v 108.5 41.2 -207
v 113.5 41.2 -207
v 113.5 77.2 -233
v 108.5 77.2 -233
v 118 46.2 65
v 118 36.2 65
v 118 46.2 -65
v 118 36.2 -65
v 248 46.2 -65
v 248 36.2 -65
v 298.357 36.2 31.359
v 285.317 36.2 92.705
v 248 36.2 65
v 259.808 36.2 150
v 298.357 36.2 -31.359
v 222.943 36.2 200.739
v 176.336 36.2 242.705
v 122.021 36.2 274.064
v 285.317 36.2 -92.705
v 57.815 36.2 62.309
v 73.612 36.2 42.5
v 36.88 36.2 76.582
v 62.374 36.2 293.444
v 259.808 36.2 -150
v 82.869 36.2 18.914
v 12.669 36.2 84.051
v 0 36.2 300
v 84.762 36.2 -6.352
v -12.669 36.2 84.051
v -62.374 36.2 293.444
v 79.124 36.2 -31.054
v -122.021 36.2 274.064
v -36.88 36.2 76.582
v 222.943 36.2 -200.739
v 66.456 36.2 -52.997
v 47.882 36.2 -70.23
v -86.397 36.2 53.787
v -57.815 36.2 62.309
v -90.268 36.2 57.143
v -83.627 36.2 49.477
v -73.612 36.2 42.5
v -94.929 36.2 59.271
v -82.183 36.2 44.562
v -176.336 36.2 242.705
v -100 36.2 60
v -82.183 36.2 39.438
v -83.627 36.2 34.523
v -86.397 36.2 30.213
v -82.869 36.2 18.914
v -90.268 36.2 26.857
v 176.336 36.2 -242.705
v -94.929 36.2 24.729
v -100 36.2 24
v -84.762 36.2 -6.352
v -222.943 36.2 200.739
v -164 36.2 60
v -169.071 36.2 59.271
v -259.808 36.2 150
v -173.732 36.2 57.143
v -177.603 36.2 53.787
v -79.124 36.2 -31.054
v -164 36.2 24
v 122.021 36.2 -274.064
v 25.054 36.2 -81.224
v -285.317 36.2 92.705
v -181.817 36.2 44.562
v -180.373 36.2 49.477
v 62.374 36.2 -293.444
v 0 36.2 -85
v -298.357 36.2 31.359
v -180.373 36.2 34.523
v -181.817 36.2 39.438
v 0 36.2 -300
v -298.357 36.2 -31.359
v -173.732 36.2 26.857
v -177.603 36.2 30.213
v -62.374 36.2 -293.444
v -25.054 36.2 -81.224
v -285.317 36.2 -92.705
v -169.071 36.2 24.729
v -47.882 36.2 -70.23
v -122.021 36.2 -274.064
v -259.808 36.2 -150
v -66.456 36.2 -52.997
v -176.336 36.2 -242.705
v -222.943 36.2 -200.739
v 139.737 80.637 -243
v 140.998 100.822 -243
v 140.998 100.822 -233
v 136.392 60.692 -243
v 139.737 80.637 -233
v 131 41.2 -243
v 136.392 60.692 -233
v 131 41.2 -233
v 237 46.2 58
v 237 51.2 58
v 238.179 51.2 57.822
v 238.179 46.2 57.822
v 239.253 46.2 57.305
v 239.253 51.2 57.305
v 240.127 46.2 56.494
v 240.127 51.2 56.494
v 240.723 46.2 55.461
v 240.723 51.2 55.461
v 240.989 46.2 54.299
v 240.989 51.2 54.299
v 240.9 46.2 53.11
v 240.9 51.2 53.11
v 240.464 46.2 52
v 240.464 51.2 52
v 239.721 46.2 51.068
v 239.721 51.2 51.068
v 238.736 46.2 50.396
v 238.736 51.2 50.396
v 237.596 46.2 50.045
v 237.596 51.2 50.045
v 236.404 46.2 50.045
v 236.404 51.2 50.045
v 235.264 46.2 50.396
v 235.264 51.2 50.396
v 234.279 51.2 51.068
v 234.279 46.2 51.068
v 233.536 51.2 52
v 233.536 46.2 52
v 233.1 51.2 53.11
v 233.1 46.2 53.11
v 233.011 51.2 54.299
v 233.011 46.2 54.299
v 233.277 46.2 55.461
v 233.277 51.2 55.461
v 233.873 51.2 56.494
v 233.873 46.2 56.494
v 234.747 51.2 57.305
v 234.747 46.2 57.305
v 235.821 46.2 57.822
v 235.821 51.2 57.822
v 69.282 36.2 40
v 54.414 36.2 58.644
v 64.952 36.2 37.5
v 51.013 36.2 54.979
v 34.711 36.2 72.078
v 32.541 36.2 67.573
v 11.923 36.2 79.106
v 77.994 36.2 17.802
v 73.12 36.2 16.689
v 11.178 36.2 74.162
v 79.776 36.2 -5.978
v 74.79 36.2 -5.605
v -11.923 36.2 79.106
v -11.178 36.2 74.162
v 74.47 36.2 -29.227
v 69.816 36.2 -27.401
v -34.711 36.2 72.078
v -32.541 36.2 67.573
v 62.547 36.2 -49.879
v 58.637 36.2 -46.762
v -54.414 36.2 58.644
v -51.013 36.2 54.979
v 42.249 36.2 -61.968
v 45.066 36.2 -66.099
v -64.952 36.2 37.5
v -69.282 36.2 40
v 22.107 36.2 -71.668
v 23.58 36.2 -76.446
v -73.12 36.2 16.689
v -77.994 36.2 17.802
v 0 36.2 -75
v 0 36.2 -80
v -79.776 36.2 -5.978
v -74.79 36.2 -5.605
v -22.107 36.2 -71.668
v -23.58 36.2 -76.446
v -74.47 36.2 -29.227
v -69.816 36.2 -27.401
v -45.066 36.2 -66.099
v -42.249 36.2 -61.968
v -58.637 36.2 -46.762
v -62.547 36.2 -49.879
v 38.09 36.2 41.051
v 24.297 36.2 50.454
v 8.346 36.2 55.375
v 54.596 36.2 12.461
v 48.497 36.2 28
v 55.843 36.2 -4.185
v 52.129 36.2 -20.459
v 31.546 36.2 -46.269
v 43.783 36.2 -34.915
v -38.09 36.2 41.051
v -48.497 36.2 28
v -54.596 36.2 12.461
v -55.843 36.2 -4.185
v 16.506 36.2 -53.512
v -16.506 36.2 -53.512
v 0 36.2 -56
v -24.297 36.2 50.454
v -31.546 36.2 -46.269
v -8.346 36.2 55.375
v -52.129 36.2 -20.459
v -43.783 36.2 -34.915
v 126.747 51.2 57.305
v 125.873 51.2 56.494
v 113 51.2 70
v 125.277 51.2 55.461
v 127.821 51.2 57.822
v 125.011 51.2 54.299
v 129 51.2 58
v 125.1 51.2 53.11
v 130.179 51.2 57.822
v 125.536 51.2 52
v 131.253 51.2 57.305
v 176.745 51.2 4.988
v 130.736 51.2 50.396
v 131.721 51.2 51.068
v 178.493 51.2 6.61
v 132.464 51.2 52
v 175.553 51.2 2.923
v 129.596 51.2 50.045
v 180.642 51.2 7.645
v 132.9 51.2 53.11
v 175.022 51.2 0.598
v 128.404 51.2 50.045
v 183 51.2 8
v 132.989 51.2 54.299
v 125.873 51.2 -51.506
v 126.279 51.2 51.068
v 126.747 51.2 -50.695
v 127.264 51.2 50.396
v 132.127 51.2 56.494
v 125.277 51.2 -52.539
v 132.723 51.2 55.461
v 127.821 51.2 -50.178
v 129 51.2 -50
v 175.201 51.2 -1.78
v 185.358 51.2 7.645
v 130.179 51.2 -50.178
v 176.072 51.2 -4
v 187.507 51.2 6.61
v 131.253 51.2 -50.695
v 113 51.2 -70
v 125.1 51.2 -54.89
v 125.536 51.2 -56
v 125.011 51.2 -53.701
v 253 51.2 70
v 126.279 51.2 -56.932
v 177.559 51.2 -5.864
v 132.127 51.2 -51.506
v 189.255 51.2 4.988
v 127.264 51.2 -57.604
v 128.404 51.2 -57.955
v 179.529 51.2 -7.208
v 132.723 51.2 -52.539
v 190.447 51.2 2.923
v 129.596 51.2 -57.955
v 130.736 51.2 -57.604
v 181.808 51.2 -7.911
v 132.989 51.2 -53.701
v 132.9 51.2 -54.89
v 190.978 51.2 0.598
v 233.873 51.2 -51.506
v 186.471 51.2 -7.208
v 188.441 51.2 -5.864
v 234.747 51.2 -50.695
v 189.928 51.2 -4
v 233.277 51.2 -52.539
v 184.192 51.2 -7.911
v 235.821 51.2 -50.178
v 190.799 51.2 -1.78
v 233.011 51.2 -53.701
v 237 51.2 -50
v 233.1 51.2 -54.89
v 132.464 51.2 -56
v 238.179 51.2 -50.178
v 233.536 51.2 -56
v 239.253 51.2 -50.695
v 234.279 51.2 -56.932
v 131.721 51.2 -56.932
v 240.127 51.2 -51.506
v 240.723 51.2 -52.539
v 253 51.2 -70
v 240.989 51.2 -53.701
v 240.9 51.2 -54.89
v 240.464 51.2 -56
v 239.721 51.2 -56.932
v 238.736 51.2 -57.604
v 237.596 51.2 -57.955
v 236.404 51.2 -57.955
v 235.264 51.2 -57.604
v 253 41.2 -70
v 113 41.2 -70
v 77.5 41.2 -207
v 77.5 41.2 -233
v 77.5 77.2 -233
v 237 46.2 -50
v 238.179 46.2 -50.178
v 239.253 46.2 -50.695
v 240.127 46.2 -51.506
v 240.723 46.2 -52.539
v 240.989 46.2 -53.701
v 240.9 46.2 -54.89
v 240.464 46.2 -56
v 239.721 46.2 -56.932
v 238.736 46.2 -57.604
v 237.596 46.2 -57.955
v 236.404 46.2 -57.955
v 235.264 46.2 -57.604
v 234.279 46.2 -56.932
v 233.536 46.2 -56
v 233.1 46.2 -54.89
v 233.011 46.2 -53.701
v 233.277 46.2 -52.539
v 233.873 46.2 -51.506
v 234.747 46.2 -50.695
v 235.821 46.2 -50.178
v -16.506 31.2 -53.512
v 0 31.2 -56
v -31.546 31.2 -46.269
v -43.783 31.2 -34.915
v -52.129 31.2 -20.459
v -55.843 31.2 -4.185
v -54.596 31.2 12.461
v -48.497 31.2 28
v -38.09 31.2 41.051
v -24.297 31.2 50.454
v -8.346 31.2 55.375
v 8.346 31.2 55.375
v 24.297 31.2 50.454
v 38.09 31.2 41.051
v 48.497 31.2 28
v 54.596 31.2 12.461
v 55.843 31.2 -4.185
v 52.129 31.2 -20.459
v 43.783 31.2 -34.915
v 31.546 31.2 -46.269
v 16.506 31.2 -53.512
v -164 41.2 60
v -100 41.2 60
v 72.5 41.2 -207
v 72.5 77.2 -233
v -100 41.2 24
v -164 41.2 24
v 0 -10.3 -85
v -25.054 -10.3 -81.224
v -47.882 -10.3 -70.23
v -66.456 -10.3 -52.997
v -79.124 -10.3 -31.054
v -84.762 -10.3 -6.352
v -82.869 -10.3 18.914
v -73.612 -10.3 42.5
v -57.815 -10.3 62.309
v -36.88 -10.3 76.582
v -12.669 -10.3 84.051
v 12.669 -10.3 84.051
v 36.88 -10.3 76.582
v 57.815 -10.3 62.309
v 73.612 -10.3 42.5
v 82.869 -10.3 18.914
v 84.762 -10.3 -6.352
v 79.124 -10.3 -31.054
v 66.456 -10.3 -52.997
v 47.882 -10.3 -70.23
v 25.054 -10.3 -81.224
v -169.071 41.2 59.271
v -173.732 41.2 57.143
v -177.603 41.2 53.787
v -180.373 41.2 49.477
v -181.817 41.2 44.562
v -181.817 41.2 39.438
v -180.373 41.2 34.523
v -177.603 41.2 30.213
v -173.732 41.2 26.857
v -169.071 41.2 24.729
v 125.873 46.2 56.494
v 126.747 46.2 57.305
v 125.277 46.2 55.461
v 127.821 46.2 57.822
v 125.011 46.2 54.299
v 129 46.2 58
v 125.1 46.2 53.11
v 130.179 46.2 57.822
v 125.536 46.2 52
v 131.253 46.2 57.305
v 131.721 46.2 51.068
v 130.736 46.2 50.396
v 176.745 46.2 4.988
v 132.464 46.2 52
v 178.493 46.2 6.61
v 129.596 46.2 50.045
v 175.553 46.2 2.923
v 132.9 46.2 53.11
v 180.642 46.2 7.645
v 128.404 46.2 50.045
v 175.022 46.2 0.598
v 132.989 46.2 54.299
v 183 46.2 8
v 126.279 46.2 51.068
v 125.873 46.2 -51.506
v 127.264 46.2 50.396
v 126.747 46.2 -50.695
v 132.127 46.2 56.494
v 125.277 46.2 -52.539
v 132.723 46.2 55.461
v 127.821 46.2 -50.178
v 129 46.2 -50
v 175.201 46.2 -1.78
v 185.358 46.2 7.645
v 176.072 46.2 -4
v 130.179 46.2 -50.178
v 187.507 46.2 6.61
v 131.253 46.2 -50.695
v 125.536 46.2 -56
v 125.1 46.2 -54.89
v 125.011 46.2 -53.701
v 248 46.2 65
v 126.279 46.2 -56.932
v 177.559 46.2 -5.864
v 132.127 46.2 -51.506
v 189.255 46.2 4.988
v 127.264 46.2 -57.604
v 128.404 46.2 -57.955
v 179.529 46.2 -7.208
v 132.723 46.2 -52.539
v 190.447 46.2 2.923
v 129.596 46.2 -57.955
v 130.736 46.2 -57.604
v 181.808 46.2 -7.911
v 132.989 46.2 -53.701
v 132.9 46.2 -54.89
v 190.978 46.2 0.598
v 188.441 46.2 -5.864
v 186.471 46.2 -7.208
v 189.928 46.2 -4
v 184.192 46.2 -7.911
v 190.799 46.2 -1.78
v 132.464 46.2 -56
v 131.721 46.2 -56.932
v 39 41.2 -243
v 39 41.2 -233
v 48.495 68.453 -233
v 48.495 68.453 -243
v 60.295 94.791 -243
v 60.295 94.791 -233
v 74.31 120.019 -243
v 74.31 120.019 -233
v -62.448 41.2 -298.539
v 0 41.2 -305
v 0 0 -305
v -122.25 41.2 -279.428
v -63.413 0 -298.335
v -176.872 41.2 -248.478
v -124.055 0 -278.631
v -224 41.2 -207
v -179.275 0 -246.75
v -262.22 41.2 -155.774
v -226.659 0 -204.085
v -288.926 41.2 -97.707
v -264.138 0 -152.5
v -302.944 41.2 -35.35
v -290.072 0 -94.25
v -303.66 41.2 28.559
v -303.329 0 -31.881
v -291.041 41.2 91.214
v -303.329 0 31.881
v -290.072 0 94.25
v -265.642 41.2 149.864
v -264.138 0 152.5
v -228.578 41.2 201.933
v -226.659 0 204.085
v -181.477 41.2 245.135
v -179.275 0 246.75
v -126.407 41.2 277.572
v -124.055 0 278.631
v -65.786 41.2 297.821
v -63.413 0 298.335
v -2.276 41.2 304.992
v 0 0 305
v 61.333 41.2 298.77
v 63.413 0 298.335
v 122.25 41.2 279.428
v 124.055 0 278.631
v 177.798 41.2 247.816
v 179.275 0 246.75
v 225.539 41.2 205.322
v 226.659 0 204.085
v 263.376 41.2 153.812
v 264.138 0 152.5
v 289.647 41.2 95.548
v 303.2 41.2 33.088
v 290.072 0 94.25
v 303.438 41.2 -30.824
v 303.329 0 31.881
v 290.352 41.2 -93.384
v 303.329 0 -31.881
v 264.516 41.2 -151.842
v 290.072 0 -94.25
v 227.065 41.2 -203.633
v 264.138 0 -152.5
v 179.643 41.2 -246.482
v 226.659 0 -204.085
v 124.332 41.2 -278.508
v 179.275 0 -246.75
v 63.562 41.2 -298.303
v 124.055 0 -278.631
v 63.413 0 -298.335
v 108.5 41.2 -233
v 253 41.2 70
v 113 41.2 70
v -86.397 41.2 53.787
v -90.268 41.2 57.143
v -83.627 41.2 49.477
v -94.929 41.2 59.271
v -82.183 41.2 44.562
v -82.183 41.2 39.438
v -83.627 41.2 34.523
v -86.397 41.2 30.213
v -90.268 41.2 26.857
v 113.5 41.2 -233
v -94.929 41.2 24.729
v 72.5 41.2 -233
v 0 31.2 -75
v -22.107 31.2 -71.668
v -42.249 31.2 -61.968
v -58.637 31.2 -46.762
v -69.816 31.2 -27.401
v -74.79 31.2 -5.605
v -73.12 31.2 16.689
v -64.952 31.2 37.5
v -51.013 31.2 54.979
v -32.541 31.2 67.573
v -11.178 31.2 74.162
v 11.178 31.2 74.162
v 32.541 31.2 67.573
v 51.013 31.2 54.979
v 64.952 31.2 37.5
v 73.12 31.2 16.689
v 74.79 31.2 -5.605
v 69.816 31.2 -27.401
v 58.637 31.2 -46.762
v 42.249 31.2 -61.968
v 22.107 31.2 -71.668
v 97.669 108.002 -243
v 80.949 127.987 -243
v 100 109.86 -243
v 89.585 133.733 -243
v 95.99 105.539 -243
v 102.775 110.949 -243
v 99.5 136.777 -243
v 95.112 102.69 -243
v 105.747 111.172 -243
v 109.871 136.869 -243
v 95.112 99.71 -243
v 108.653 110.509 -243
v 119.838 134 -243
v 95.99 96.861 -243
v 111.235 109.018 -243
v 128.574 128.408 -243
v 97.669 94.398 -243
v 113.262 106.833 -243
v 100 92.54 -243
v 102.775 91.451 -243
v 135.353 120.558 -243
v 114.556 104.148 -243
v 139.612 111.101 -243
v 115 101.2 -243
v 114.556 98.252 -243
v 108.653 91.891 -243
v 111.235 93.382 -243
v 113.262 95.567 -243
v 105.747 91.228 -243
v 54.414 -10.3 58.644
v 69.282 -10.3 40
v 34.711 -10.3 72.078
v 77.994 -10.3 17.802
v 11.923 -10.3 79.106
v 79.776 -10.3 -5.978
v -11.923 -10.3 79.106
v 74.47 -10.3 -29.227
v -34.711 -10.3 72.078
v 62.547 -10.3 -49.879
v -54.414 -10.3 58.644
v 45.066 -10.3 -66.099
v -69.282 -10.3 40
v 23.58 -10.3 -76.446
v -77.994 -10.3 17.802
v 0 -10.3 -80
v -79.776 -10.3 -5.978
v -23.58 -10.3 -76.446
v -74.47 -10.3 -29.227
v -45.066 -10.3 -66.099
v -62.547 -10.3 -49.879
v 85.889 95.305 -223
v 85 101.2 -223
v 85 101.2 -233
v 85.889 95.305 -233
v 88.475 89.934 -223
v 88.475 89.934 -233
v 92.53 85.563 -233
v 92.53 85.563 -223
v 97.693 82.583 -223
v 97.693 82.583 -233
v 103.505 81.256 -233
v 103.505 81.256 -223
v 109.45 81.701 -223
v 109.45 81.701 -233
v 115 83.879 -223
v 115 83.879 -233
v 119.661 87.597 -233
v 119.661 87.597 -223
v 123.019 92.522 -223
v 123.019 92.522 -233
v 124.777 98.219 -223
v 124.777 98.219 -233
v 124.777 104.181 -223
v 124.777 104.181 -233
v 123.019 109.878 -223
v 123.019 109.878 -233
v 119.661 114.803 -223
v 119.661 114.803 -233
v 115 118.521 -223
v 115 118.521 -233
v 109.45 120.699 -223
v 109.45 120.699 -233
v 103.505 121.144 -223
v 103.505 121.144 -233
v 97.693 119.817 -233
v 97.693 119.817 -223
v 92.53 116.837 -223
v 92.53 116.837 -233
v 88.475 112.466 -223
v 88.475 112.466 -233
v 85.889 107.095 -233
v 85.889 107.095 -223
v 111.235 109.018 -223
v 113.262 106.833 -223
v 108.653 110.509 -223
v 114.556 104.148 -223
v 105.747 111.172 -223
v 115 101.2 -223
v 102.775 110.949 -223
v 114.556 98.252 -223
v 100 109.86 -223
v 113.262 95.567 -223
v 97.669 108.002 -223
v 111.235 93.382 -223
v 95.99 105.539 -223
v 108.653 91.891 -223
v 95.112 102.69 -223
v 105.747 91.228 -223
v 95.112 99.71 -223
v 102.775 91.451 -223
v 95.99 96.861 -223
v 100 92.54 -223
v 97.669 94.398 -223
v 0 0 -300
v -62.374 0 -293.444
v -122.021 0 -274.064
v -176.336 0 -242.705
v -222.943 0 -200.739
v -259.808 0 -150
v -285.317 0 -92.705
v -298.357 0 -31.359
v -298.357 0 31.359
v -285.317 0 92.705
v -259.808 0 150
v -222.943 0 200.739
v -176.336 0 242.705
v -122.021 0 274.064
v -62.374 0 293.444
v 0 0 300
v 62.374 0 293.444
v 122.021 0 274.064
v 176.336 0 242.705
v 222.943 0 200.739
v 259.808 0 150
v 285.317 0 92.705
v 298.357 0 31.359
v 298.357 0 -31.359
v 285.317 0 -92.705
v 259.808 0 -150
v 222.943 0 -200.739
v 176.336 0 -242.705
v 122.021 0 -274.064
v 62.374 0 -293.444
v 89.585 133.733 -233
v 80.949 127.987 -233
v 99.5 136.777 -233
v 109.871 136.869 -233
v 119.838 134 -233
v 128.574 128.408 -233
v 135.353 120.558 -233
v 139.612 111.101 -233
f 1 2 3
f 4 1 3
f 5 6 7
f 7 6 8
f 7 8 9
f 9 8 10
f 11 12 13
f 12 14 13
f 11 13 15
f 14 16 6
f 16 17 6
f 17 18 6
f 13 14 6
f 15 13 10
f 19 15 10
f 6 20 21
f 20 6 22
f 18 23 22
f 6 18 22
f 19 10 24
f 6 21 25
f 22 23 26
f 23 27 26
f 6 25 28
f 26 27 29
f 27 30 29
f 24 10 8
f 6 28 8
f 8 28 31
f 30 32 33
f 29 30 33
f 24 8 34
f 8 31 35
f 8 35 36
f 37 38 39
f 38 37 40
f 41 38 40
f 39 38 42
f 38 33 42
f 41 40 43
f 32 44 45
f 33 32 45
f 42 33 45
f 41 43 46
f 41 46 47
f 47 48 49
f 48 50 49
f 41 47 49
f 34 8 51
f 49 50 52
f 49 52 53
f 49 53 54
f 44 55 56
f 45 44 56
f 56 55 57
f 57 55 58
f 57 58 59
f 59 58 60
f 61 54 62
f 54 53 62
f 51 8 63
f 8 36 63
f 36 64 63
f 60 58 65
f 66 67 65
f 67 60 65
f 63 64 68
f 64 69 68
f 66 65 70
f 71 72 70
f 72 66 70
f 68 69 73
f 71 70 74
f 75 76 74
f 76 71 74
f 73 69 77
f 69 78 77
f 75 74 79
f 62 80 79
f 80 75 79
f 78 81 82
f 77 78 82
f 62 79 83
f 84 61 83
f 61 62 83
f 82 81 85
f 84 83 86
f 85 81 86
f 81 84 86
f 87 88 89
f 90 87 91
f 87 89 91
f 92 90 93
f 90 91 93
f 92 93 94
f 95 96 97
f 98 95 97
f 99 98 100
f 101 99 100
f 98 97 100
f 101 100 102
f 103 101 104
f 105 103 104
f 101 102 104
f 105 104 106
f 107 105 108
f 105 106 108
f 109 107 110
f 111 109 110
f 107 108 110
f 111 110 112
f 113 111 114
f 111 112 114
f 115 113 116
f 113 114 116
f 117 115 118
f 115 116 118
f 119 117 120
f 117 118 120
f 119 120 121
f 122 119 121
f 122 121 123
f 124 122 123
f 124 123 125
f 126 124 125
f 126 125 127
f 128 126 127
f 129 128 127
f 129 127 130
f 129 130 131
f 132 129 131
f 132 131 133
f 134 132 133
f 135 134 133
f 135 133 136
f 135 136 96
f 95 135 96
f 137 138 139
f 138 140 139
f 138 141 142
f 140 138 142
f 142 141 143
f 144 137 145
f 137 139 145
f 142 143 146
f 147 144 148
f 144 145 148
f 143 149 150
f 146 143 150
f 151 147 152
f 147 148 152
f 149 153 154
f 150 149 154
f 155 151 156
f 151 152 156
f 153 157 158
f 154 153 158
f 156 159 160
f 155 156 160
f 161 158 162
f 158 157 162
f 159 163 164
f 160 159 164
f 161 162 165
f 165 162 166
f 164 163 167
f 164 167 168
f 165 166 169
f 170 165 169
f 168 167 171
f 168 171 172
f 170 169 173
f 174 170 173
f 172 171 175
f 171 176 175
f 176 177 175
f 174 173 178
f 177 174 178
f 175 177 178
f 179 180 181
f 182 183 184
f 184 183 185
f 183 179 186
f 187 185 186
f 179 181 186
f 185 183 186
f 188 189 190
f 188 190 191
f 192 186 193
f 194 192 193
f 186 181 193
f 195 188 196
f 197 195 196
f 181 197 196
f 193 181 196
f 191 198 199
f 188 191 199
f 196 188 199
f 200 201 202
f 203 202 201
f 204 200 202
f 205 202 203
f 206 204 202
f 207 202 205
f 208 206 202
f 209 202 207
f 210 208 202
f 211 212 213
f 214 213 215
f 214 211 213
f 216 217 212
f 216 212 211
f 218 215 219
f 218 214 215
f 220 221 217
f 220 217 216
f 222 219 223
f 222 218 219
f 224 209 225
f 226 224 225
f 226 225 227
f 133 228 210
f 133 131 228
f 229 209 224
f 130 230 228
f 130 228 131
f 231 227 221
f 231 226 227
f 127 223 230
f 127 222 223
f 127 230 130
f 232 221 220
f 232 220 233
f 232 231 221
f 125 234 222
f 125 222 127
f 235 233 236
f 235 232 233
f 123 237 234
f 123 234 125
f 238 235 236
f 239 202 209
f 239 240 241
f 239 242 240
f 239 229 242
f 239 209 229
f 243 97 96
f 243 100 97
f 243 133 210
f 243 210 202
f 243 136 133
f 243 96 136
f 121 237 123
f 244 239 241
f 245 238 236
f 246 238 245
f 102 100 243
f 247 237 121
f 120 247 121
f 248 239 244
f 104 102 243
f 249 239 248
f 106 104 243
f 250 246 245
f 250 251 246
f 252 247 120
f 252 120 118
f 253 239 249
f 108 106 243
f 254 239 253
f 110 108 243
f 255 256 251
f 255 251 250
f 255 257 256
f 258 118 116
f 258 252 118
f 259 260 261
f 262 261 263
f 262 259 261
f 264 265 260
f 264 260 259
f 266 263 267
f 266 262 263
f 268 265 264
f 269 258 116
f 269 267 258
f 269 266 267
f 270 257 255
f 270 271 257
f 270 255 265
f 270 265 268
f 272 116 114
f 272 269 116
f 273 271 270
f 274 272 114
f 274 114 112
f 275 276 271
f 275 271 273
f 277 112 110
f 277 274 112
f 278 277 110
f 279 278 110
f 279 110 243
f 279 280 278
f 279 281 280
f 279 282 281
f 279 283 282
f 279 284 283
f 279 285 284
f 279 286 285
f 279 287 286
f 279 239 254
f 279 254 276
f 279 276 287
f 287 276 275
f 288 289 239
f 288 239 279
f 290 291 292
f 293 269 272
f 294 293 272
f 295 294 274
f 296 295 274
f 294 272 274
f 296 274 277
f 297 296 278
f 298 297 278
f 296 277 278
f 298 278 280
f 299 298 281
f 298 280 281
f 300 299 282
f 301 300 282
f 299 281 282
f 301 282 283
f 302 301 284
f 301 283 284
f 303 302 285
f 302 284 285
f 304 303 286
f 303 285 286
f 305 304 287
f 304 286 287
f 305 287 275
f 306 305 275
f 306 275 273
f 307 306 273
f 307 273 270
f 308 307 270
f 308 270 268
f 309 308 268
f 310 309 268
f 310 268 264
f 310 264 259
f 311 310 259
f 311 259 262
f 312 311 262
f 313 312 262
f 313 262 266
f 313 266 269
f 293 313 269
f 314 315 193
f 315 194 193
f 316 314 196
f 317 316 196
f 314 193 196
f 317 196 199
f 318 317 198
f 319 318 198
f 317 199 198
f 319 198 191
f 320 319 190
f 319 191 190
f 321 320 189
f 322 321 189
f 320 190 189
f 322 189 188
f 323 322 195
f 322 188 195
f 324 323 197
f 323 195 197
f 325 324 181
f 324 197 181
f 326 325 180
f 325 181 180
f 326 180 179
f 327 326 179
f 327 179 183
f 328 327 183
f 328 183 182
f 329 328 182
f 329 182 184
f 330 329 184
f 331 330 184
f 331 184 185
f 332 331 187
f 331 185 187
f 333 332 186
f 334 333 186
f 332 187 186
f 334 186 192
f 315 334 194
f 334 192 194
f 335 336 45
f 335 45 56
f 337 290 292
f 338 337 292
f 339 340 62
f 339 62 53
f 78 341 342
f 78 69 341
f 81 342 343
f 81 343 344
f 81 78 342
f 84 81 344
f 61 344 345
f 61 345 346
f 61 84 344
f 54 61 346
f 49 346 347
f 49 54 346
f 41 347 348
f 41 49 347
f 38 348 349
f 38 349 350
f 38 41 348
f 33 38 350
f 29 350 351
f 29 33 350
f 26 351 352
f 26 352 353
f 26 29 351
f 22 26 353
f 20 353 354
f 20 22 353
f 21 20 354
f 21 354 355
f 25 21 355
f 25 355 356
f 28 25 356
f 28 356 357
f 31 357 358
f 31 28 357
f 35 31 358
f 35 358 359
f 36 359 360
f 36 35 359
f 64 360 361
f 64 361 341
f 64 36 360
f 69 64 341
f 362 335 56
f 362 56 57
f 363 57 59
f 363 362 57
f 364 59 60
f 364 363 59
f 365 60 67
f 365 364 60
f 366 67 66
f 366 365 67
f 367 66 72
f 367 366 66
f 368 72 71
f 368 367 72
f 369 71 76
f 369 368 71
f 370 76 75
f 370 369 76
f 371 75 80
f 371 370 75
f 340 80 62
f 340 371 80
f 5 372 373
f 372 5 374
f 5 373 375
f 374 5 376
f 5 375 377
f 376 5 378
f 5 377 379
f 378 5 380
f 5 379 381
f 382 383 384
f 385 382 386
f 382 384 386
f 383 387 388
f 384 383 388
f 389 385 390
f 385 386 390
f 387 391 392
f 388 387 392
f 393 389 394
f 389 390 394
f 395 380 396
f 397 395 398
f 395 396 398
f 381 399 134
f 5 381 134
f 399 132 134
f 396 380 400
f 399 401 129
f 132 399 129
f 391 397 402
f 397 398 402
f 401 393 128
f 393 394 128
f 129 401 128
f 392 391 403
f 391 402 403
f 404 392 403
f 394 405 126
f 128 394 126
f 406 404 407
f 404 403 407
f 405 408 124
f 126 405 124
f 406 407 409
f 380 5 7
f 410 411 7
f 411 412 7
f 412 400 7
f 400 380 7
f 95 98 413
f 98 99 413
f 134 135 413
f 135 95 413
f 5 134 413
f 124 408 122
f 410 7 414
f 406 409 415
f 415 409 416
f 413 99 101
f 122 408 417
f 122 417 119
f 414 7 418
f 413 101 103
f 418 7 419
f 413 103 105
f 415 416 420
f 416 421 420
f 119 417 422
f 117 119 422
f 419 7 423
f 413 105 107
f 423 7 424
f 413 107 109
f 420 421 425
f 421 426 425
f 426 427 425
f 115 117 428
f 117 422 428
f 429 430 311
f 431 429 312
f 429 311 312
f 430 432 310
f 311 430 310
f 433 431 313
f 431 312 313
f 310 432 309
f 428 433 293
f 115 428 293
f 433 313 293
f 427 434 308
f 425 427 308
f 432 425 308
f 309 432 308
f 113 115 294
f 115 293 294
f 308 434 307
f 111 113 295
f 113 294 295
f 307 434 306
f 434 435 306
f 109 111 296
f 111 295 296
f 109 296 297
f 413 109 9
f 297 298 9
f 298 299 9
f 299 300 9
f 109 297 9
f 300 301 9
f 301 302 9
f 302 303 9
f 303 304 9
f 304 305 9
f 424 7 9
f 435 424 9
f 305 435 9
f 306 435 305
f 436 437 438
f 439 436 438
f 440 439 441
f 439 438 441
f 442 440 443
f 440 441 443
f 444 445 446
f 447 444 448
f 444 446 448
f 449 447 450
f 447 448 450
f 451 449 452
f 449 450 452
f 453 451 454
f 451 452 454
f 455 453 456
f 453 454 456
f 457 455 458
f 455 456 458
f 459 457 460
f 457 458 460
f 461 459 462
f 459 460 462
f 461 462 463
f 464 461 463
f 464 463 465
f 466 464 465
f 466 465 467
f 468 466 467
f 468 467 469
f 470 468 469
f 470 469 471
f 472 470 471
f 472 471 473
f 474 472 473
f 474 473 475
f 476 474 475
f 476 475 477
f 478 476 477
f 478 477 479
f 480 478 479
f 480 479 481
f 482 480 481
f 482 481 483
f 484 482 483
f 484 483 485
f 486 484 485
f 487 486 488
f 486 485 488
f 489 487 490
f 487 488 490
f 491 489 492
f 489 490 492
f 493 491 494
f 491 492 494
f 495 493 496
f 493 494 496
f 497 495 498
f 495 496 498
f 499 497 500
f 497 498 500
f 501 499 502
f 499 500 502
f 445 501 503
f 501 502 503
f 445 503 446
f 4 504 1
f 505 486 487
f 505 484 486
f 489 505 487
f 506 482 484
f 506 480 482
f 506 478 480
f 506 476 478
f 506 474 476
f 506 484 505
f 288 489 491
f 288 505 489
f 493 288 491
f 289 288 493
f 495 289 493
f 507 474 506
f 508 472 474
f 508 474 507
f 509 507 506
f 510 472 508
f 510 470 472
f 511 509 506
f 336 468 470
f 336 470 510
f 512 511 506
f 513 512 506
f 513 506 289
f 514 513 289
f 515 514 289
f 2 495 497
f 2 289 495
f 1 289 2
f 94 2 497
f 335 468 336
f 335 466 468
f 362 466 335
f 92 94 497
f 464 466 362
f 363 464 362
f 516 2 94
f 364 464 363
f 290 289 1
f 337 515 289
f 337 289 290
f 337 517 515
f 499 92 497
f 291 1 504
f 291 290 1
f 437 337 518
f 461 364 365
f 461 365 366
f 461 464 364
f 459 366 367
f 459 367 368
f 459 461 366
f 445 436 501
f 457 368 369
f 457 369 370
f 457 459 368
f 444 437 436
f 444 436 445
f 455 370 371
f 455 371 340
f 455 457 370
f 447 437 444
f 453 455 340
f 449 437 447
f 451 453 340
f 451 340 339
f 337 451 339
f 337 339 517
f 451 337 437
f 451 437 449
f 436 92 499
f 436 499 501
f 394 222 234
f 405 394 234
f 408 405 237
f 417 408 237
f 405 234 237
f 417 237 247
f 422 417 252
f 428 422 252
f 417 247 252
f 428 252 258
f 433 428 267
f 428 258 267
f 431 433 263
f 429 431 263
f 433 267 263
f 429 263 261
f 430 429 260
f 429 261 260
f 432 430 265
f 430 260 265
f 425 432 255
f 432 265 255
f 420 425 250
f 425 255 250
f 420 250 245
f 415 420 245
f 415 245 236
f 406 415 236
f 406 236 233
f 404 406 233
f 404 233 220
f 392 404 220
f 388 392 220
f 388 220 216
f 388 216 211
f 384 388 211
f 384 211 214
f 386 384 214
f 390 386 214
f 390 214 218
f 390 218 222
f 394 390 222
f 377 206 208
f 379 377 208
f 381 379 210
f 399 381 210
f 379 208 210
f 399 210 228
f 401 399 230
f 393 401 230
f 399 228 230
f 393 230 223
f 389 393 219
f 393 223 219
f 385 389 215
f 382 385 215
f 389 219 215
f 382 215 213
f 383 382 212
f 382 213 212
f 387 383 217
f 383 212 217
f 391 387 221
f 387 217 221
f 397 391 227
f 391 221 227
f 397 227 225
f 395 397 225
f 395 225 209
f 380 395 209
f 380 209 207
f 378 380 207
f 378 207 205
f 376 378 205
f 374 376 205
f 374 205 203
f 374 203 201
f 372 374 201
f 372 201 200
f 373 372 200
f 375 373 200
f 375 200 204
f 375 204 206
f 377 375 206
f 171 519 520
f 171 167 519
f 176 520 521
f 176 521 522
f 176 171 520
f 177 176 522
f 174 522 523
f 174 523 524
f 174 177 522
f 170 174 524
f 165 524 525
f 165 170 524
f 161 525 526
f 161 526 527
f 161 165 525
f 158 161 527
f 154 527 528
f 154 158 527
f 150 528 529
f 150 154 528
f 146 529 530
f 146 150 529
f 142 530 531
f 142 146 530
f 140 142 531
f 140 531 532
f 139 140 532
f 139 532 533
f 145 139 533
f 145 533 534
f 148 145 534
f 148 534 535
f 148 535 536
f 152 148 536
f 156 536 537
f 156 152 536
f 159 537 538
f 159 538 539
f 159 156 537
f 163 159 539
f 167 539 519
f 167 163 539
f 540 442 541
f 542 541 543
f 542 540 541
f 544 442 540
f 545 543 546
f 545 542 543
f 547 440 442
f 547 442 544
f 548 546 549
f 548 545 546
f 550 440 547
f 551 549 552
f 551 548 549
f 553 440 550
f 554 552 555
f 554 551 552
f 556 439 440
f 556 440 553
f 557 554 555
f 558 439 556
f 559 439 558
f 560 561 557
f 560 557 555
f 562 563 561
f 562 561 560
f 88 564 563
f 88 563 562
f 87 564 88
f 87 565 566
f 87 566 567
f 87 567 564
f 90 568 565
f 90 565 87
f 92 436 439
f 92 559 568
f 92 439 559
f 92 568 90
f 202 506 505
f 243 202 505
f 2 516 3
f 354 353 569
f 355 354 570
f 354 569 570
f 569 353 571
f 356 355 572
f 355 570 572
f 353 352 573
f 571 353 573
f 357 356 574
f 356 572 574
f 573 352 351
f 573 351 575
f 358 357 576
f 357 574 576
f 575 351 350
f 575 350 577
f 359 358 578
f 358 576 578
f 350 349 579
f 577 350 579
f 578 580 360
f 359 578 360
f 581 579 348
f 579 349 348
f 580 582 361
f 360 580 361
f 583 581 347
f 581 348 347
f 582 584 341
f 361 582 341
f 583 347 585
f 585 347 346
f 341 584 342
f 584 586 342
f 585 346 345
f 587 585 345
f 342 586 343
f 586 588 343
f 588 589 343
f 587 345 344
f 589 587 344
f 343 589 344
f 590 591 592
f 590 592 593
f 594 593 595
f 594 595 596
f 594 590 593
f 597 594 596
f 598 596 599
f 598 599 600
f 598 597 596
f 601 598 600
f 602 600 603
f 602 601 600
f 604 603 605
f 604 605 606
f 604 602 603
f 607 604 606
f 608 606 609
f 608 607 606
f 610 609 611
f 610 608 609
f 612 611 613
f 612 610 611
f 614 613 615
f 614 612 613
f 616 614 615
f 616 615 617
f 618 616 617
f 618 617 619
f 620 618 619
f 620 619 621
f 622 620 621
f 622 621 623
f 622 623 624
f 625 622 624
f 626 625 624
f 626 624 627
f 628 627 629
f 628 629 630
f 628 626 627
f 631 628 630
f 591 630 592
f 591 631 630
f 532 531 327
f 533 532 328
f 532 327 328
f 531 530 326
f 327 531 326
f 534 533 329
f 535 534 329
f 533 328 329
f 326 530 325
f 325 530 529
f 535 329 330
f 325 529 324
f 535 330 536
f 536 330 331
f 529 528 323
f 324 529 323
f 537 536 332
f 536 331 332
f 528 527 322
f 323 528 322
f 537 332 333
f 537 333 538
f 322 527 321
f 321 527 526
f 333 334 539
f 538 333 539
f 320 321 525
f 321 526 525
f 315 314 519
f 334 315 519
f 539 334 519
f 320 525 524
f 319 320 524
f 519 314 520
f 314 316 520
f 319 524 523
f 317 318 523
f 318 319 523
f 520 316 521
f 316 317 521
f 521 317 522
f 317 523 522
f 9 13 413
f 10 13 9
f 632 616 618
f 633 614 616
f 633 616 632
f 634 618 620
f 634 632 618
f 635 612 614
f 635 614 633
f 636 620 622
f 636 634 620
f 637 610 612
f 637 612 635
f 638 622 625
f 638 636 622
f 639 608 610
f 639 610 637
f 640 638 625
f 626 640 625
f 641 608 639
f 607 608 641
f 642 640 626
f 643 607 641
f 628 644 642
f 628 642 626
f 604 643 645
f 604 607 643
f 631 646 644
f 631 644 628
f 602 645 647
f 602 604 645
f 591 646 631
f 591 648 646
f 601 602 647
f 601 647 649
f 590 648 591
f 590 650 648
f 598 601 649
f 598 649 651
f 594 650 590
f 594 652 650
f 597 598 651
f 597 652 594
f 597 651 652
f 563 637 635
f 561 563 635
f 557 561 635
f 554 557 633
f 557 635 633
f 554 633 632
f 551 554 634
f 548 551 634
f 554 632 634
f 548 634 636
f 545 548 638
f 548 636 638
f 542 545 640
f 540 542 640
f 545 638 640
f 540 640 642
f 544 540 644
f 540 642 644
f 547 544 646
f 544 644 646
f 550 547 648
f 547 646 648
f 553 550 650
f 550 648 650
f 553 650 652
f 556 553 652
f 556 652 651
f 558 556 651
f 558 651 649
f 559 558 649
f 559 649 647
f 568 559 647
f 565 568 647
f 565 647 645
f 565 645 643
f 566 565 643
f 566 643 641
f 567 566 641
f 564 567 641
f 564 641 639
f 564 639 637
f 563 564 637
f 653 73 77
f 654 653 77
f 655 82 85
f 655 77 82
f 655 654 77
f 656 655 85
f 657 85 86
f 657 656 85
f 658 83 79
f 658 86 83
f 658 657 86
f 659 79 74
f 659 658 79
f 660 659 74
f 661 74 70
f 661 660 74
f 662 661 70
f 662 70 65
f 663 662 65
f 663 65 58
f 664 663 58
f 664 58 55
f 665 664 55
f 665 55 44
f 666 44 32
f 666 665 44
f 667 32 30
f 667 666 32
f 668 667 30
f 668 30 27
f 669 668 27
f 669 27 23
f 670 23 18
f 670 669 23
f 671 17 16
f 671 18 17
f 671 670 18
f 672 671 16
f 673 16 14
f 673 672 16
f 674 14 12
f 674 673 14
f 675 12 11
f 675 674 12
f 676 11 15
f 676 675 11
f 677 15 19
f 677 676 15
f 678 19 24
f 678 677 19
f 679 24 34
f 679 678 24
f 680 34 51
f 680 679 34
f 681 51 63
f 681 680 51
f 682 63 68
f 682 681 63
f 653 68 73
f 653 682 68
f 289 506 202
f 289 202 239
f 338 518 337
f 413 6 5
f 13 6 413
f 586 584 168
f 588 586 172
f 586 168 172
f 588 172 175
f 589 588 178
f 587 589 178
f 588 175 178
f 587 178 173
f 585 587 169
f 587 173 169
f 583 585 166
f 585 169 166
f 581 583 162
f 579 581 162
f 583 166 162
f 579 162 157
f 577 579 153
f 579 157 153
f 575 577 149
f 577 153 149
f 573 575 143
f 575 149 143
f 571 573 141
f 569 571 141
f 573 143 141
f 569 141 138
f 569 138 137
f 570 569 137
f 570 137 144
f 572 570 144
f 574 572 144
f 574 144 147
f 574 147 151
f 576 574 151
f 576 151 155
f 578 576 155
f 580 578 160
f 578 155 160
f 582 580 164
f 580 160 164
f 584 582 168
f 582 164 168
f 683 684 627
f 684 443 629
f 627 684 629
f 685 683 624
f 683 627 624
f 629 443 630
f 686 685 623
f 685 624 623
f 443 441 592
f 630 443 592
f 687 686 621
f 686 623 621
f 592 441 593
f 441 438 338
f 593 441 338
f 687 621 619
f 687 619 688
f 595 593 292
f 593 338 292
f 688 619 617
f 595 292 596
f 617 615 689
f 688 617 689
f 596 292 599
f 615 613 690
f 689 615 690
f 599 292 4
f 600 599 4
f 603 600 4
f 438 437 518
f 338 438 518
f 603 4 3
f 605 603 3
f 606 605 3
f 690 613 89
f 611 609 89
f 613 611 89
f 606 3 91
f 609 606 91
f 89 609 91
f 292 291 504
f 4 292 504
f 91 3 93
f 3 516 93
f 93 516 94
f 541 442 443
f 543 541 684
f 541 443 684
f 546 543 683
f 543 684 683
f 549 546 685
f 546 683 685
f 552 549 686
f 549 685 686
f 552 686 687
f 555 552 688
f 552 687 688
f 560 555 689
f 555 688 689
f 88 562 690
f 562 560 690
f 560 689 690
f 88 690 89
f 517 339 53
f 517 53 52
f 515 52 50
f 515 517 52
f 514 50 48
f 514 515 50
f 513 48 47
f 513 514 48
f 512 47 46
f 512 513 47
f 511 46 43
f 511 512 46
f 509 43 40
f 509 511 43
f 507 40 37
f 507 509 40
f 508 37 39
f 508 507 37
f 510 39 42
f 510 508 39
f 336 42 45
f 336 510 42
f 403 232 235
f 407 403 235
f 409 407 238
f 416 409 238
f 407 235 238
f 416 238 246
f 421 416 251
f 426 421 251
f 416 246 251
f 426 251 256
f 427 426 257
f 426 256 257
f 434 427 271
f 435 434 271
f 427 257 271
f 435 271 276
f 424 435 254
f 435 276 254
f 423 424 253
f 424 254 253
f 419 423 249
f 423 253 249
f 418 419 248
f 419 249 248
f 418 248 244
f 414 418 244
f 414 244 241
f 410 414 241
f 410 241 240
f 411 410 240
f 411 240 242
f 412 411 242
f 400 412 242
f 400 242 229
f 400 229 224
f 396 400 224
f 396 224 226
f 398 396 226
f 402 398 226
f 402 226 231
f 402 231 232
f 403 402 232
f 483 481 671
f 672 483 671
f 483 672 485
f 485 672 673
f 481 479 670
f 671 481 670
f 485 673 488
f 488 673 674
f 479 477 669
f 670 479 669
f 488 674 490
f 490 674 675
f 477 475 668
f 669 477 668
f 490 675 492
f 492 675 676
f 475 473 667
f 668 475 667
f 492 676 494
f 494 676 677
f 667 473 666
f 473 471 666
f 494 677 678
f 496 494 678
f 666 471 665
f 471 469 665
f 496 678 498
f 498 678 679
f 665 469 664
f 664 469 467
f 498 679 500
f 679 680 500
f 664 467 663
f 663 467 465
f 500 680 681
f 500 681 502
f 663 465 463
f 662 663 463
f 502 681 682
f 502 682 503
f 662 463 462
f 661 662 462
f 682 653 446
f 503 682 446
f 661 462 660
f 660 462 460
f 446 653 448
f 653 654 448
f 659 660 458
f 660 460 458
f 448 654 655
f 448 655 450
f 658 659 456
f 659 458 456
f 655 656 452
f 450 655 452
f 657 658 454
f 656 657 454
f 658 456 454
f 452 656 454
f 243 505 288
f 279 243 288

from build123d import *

# Parameters (mm, degrees)
SKETCH_1_R          = 305
EXTRUDE_1_DEPTH     = 41.2
SKETCH_2_W          = 140
SKETCH_2_H          = 140
EXTRUDE_2_DEPTH     = 10
SHELL_1_T           = -5
CUT_EXTRUDE_1_DEPTH = 10
SKETCH_4_W          = 120
SKETCH_4_H          = 10
EXTRUDE_3_DEPTH     = 150
CUT_EXTRUDE_3_DEPTH = 648.322516216
SKETCH_6_R          = 10
CUT_EXTRUDE_5_DEPTH = 634.476787262
EXTRUDE_START       = 10
SKETCH_7_R          = 20
SKETCH_7_R_2        = 10
EXTRUDE_4_DEPTH     = 10
SKETCH_8_W          = 5
SKETCH_8_H          = 36
EXTRUDE_5_DEPTH     = 26
CUT_EXTRUDE_6_DEPTH = 536.715493522
SKETCH_10_W         = 5
SKETCH_10_H         = 46.5
SKETCH_10_W_2       = 19
SKETCH_10_H_2       = 5
SKETCH_11_R         = 8
SKETCH_11_R_2       = 4
CUT_EXTRUDE_7_DEPTH = 440.824965185


with BuildPart() as part:
    # 草图1 → 凸台-拉伸1 (new body)
    with BuildSketch(Plane(origin=(0, 0, 0), x_dir=(1, 0, 0), z_dir=(0, 1, 0))):
        with Locations(Location((0, 0, 0), (0, 0, 90))):
            Circle(SKETCH_1_R)
    extrude(amount=EXTRUDE_1_DEPTH)

    # 草图2 → 凸台-拉伸2 (add)
    with BuildSketch(Plane(origin=(0, 41.2, 0), x_dir=(1, 0, 0), z_dir=(0, 1, 0))):
        with Locations((183, 0)):
            Rectangle(SKETCH_2_W, SKETCH_2_H)
    extrude(amount=EXTRUDE_2_DEPTH)

    # 抽壳1
    shell_1_openings = [part.faces().sort_by_distance(p)[0] for p in [
        (0, 0, 0),
    ]]
    offset(amount=SHELL_1_T, openings=shell_1_openings, kind=Kind.INTERSECTION)

    # 草图3 → 切除-拉伸1 (cut)
    with BuildSketch(Plane(origin=(0, 41.2, 0), x_dir=(1, 0, 0), z_dir=(0, 1, 0))):
        with BuildLine():
            Line((-164, -24), (-100, -24))
            ThreePointArc((-100, -24), (-82, -42), (-100, -60))
            Line((-100, -60), (-164, -60))
            ThreePointArc((-164, -60), (-182, -42), (-164, -24))
        make_face()
    extrude(amount=-CUT_EXTRUDE_1_DEPTH, mode=Mode.SUBTRACT)

    # 草图4 → 凸台-拉伸3 (add)
    with BuildSketch(Plane(origin=(0, 41.2, 0), x_dir=(1, 0, 0), z_dir=(0, 1, 0))):
        with Locations((99, 238)):
            Rectangle(SKETCH_4_W, SKETCH_4_H)
    extrude(amount=EXTRUDE_3_DEPTH)

    # 草图5 → 切除-拉伸3 (cut, through all)
    with BuildSketch(Plane.XY.offset(-233)):
        with BuildLine():
            Line((131, 41.2), (159, 41.2))
            Line((159, 41.2), (159, 191.2))
            Line((159, 191.2), (39, 191.2))
            Line((39, 191.2), (39, 41.2))
            ThreePointArc((39, 41.2), (54.112125435, 81.748594957), (74.310300259, 120.018669715))
            ThreePointArc((74.310300259, 120.018669715), (114.95864882, 135.795163154), (140.99801314, 100.821780537))
            ThreePointArc((140.99801314, 100.821780537), (138.32356193, 70.621084147), (131, 41.2))
        make_face()
    extrude(amount=-CUT_EXTRUDE_3_DEPTH, mode=Mode.SUBTRACT)

    # 草图6 → 切除-拉伸5 (cut, through all)
    with BuildSketch(Plane.XY.offset(-233)):
        with Locations((105, 101.2)):
            Circle(SKETCH_6_R)
    extrude(amount=-CUT_EXTRUDE_5_DEPTH, mode=Mode.SUBTRACT)

    # 草图7 → 凸台-拉伸4 (add)
    with BuildSketch(Plane.XY.offset(-233).offset(EXTRUDE_START)):
        with Locations(Location((105, 101.2, 0), (0, 0, 180))):
            Circle(SKETCH_7_R)
        with Locations((105, 101.2)):
            Circle(SKETCH_7_R_2, mode=Mode.SUBTRACT)
    extrude(amount=-EXTRUDE_4_DEPTH)

    # 草图8 → 凸台-拉伸5 (add)
    with BuildSketch(Plane.XY.offset(-233)):
        with Locations((75, 59.2)):
            Rectangle(SKETCH_8_W, SKETCH_8_H)
        with Locations((111, 59.2)):
            Rectangle(SKETCH_8_W, SKETCH_8_H)
    extrude(amount=EXTRUDE_5_DEPTH)

    # 草图9 → 切除-拉伸6 (cut, through all)
    with BuildSketch(Plane(origin=(113.5, 0, 0), x_dir=(0, 0, -1), z_dir=(1, 0, 0))):
        Polygon((207, 41.2), (233, 77.2), (207, 77.2), align=None)
    extrude(amount=-CUT_EXTRUDE_6_DEPTH, mode=Mode.SUBTRACT)

    # 草图10 → 旋转1 (revolve)
    with BuildSketch(Plane.XY, mode=Mode.PRIVATE) as revolve_1_sk:
        with Locations((-82.5, 12.95)):
            Rectangle(SKETCH_10_W, SKETCH_10_H)
        with Locations((-65.5, 33.7)):
            Rectangle(SKETCH_10_W_2, SKETCH_10_H_2)
    revolve(revolve_1_sk.sketch.rotate(Axis((0, 0, 0), (0, 1, 0)), 270), axis=Axis((0, 0, 0), (0, 1, 0)))

    # 草图11 → 切除-拉伸7 (cut, through all)
    with BuildSketch(Plane(origin=(0, 51.2, 0), x_dir=(1, 0, 0), z_dir=(0, 1, 0))):
        with Locations(Location((183, 0, 0), (0, 0, 270))):
            Circle(SKETCH_11_R)
        with Locations(Location((237, 54, 0), (0, 0, 270))):
            Circle(SKETCH_11_R_2)
        with Locations(Location((129, 54, 0), (0, 0, 270))):
            Circle(SKETCH_11_R_2)
        with Locations(Location((129, -54, 0), (0, 0, 270))):
            Circle(SKETCH_11_R_2)
        with Locations(Location((237, -54, 0), (0, 0, 270))):
            Circle(SKETCH_11_R_2)
    extrude(amount=-CUT_EXTRUDE_7_DEPTH, mode=Mode.SUBTRACT)


solid = part.part
